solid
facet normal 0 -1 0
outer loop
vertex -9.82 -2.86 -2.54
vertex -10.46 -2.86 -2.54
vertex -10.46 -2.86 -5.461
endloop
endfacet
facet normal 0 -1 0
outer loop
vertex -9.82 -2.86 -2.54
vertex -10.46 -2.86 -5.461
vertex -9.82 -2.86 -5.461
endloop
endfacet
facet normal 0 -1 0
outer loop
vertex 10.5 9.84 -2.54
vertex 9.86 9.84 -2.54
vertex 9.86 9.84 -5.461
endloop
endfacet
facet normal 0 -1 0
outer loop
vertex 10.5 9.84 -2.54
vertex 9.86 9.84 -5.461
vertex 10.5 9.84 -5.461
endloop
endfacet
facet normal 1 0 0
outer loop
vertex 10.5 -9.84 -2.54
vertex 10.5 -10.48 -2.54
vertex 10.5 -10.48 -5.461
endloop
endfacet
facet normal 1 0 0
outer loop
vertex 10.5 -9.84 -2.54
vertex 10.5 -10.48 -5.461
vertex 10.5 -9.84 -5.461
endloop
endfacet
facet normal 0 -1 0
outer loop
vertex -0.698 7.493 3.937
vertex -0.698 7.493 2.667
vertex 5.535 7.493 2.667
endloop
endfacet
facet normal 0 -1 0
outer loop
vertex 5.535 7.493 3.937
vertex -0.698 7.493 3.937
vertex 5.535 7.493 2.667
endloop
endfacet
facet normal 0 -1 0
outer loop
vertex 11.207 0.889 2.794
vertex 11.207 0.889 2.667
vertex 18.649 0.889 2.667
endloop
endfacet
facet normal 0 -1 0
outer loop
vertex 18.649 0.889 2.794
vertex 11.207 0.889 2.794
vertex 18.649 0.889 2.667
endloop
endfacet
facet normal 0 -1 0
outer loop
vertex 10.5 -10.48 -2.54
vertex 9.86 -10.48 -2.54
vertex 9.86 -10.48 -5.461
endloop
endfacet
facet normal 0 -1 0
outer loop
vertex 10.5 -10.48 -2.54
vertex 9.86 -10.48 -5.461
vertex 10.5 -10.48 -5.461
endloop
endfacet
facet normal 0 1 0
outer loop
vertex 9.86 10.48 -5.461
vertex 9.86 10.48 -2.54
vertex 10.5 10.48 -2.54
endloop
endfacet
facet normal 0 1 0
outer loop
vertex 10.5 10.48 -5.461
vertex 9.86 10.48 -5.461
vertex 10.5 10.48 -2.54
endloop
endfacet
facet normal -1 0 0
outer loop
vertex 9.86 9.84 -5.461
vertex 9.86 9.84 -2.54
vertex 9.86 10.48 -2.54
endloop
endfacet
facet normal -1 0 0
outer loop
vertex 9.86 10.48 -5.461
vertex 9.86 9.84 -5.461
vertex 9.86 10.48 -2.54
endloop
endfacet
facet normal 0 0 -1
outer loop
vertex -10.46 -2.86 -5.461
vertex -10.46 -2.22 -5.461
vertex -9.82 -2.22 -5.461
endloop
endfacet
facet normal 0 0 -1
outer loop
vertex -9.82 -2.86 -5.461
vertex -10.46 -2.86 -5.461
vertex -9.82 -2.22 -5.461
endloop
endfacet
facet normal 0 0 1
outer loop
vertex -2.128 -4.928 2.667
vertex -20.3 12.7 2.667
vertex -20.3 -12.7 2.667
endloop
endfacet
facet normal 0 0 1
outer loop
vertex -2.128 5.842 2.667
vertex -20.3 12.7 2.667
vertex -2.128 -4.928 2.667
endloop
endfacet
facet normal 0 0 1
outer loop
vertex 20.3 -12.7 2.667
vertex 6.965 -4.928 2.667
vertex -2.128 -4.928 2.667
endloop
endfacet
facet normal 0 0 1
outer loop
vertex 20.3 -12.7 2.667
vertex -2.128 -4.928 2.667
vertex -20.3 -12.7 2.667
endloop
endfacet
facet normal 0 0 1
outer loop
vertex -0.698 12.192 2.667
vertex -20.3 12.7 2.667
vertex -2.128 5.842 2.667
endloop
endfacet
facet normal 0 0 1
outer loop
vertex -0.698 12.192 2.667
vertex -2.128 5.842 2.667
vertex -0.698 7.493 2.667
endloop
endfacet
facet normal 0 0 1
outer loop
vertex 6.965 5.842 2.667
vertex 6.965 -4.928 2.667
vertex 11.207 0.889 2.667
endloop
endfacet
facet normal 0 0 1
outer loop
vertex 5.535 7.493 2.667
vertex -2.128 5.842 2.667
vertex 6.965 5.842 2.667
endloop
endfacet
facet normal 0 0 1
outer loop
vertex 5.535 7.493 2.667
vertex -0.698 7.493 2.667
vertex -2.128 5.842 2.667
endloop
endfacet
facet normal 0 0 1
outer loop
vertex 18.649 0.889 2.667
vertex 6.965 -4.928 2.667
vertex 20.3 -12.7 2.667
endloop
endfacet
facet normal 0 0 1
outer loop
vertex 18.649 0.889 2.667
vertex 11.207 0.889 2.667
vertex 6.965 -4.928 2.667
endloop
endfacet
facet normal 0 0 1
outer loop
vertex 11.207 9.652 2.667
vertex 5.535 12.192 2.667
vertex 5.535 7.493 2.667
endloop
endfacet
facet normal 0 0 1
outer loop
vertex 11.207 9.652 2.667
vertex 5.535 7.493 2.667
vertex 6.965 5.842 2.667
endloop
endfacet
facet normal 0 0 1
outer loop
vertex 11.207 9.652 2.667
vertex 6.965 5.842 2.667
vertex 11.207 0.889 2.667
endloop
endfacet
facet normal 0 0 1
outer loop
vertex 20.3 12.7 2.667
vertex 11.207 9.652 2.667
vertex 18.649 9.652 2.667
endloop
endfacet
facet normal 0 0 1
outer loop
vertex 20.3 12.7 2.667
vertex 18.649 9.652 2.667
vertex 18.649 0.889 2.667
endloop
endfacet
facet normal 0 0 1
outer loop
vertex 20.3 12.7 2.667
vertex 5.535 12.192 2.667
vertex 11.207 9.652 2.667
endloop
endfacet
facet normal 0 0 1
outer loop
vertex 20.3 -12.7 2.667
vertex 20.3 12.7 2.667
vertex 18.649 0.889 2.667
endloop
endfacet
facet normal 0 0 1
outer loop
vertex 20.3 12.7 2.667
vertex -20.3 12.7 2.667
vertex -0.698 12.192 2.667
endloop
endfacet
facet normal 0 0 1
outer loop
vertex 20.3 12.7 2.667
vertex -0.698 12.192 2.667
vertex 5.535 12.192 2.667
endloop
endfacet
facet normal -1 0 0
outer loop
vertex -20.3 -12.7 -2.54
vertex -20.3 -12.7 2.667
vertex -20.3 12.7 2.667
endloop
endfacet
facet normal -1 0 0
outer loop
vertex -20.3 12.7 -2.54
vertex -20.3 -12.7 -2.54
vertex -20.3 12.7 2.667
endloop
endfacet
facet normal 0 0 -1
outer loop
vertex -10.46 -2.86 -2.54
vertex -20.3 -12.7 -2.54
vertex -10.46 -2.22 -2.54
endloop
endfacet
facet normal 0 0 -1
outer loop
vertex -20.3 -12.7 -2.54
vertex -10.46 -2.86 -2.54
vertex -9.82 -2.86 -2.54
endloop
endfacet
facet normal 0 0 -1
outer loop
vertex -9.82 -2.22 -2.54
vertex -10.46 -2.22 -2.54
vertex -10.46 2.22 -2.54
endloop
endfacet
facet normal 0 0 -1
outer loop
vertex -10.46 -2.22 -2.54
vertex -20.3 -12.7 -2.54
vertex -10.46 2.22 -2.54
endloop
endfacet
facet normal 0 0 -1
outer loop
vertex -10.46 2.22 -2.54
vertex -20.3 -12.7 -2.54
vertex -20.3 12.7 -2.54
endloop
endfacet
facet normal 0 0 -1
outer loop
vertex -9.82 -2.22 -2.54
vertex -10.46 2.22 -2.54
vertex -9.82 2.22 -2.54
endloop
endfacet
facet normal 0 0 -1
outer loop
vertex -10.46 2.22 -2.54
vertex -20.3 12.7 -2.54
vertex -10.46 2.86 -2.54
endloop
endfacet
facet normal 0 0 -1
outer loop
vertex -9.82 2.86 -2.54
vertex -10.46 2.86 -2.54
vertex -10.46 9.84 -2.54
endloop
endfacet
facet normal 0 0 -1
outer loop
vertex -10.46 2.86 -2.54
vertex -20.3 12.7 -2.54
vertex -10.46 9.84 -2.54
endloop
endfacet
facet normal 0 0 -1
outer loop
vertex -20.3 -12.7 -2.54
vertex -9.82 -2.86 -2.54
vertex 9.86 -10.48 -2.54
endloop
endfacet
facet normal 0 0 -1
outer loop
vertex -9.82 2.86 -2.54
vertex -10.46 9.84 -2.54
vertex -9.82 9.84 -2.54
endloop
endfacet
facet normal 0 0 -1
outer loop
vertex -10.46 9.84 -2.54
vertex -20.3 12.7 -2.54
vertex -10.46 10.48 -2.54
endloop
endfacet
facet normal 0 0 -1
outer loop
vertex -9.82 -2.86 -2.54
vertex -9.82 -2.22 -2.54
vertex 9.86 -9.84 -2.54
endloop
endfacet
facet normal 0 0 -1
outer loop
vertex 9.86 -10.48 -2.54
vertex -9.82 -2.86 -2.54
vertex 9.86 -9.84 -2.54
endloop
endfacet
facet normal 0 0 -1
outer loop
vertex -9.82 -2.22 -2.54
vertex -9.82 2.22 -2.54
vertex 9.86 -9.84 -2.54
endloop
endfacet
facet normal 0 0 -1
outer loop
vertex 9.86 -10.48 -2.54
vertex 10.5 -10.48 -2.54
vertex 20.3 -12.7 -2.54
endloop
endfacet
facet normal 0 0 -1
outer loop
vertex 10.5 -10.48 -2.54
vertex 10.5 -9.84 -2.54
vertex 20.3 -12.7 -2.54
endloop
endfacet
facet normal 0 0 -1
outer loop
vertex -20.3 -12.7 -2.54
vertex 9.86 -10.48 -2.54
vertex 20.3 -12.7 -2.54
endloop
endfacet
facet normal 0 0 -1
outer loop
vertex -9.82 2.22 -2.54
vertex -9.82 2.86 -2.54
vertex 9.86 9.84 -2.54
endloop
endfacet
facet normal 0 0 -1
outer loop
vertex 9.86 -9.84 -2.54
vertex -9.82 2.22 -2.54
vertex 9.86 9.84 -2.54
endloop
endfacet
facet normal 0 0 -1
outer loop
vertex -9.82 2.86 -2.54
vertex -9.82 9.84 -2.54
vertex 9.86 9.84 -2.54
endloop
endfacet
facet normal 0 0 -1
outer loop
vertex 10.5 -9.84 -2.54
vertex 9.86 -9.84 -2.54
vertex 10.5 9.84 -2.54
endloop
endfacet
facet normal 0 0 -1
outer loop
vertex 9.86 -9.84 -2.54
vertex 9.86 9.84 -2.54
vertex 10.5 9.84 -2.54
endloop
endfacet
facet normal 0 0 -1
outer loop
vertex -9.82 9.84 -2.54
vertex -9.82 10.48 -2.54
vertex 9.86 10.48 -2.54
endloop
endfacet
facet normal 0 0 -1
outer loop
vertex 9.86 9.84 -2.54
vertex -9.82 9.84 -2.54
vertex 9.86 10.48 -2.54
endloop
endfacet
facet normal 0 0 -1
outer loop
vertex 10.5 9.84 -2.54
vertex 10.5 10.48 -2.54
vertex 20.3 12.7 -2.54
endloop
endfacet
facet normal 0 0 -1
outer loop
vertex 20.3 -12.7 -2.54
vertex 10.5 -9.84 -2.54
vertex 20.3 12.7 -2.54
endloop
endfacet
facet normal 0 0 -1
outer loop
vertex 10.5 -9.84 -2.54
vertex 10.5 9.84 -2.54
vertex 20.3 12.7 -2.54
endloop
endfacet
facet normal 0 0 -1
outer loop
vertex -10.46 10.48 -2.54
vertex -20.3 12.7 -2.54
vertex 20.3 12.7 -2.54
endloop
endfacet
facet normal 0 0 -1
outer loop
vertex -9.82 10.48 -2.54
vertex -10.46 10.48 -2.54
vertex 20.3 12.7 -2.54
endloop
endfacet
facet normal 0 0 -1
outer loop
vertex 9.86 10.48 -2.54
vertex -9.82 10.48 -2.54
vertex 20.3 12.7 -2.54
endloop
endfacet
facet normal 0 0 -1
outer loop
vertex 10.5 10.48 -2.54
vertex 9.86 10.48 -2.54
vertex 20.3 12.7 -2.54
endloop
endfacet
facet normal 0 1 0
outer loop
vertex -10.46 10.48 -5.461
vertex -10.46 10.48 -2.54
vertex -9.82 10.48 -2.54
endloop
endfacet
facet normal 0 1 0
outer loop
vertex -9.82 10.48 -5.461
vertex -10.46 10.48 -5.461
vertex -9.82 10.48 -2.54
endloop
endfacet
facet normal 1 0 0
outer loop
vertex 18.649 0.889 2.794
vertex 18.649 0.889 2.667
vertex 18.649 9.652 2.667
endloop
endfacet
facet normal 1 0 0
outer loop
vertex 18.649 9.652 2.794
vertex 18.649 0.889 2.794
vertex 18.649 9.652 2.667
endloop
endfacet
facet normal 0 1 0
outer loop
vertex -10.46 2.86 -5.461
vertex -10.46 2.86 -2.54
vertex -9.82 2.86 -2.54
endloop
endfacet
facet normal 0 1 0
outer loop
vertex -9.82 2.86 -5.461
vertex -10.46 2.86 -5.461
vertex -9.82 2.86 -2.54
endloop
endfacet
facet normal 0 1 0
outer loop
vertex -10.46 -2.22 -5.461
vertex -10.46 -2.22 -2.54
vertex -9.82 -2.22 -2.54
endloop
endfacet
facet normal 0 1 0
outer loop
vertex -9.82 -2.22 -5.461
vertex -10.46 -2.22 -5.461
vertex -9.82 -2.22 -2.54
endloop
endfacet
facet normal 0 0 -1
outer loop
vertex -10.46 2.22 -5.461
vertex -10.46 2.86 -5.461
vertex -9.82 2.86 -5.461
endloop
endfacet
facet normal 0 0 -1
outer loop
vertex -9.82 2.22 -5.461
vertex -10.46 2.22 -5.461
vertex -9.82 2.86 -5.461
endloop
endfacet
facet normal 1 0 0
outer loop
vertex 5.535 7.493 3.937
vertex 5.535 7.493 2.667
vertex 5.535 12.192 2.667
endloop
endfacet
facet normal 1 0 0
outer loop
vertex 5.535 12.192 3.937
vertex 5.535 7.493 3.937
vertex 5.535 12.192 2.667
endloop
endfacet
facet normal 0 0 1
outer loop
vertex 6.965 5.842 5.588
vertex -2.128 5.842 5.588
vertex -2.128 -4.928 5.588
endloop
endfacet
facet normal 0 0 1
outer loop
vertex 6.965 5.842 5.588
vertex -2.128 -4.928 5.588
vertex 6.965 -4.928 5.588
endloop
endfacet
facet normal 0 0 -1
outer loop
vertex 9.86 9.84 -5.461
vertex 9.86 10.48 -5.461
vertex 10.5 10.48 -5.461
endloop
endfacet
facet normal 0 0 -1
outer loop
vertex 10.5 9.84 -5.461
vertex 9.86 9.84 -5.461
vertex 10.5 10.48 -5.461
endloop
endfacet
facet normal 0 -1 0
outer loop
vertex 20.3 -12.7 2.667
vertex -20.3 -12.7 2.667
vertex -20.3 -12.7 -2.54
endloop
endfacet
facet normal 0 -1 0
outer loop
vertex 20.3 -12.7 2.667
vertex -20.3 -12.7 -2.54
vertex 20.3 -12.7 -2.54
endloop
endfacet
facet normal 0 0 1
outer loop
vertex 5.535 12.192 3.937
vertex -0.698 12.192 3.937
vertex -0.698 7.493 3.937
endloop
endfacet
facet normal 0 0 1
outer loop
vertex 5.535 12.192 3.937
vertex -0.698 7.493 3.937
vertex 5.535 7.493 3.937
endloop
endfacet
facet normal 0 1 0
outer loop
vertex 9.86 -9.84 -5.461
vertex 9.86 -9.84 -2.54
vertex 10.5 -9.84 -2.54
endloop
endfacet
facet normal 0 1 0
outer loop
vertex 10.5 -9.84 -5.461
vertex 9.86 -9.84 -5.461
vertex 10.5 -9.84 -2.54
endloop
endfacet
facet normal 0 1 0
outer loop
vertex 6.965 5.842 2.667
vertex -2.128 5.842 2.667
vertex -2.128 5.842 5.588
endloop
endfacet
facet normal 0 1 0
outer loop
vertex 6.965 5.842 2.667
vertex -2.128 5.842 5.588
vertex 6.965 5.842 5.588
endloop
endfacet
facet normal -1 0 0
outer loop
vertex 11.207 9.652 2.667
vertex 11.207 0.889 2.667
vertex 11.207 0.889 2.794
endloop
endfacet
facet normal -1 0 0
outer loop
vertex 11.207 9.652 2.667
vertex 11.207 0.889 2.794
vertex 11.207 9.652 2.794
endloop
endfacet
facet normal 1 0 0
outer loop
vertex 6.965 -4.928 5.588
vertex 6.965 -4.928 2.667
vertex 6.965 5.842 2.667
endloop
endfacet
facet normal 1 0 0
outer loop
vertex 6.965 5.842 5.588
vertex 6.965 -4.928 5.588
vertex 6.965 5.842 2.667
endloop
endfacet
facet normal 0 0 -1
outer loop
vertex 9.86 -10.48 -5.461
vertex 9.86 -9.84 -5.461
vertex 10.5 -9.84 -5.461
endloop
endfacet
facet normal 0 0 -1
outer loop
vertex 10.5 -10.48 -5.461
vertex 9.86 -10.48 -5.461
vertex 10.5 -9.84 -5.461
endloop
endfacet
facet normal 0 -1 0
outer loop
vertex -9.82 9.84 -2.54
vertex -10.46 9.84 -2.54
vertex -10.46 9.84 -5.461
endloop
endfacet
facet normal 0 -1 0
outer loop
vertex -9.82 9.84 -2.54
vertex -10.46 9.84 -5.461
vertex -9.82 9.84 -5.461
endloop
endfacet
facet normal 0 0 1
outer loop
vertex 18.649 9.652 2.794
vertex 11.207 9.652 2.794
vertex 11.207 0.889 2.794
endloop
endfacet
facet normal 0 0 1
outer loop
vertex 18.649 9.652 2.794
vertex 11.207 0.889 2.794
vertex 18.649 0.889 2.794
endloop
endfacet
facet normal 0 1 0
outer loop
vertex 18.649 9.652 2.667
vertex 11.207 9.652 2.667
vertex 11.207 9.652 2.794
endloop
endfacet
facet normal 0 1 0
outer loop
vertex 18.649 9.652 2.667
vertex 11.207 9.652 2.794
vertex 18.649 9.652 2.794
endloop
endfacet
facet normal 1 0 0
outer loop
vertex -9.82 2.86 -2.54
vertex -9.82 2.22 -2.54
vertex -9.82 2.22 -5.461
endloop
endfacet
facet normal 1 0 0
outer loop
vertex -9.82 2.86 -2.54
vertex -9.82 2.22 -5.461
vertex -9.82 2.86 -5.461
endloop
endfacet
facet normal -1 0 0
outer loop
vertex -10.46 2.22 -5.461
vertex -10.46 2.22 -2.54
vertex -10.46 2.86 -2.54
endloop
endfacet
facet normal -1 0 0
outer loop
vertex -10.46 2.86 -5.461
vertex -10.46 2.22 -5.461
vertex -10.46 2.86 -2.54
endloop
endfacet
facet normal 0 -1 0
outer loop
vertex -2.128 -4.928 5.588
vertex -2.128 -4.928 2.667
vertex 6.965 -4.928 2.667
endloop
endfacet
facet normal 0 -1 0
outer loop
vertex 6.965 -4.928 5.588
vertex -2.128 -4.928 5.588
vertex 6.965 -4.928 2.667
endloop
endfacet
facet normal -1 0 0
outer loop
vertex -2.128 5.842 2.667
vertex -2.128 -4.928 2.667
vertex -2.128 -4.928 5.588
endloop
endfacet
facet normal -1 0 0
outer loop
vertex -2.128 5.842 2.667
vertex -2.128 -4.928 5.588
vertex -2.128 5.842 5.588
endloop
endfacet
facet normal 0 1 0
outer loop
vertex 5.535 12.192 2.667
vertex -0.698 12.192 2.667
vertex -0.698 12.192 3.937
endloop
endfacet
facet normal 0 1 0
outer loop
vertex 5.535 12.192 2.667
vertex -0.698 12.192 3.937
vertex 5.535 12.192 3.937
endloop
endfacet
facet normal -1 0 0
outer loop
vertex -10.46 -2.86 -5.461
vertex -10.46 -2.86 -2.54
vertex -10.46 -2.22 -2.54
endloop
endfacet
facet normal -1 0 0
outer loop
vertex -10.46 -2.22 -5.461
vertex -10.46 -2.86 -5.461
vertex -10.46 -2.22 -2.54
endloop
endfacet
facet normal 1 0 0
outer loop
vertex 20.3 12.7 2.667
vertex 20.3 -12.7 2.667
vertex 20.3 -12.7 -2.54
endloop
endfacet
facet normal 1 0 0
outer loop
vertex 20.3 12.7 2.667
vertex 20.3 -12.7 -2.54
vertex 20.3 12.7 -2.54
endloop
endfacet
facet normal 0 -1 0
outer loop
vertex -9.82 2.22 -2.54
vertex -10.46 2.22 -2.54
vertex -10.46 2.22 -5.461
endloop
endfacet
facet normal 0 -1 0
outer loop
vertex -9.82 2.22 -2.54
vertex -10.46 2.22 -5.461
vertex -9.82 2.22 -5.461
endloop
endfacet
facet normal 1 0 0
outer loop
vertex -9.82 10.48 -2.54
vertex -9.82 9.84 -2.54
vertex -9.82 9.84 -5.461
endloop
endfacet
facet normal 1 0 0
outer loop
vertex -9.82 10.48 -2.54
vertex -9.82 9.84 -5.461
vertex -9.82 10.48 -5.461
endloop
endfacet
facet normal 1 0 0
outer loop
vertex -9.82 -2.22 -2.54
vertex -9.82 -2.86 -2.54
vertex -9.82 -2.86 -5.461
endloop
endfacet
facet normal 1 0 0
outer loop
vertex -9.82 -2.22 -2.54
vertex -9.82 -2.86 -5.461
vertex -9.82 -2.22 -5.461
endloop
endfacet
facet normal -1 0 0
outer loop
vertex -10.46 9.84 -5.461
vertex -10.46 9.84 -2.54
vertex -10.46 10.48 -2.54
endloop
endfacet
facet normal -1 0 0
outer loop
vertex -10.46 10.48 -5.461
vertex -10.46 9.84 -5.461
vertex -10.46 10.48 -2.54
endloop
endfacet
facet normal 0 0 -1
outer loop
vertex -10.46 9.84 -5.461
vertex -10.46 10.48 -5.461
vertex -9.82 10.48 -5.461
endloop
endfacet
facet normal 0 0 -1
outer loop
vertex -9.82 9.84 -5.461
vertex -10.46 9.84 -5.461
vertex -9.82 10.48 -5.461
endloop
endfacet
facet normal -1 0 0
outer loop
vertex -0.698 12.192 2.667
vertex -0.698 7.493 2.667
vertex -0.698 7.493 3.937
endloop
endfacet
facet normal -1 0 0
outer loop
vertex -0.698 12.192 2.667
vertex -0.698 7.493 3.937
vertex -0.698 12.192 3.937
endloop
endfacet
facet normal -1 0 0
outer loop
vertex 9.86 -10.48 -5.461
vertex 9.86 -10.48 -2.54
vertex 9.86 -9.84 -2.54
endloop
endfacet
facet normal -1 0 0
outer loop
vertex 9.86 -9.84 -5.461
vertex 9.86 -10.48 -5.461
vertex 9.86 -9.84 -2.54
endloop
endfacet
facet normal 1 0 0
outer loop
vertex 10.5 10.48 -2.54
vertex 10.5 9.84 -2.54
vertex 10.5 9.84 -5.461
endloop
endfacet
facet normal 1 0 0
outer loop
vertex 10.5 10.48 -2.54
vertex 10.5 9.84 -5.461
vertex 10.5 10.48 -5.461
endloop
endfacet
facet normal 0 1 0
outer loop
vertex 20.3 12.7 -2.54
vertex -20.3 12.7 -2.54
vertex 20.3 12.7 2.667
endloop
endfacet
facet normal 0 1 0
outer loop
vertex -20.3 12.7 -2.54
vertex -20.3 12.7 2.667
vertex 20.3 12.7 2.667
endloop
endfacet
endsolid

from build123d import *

# Parameters (mm, degrees)
F0_W     = 40.6
F0_H     = 25.4
F0_W_2   = 0.64
F0_H_2   = 0.64
F0_W_3   = 9.0932
F0_H_3   = 10.7696
F0_W_4   = 7.4422
F0_H_4   = 8.763
F0_W_5   = 6.23316
F0_H_5   = 4.699
F1_DEPTH = 2.667
F2_DEPTH = 5.588
F3_DEPTH = 3.937
F4_DEPTH = 2.794
F5_DEPTH = 2.54
F6_DEPTH = 5.461


with BuildPart() as f1:
    # F0 (on Top) → F1 (new body)
    with BuildSketch(Plane.XY):
        Rectangle(F0_W, F0_H)
        with Locations((-10.14, -2.54)):
            Rectangle(F0_W_2, F0_H_2, mode=Mode.SUBTRACT)
        with Locations((10.18, -10.16)):
            Rectangle(F0_W_2, F0_H_2, mode=Mode.SUBTRACT)
        with Locations((-10.14, 2.54)):
            Rectangle(F0_W_2, F0_H_2, mode=Mode.SUBTRACT)
        with Locations((-10.14, 10.16)):
            Rectangle(F0_W_2, F0_H_2, mode=Mode.SUBTRACT)
        with Locations((2.4184, 0.4572)):
            Rectangle(F0_W_3, F0_H_3, mode=Mode.SUBTRACT)
        with Locations((14.9279, 5.2705)):
            Rectangle(F0_W_4, F0_H_4, mode=Mode.SUBTRACT)
        with Locations((2.4184, 9.8425)):
            Rectangle(F0_W_5, F0_H_5, mode=Mode.SUBTRACT)
        with Locations((10.18, 10.16)):
            Rectangle(F0_W_2, F0_H_2, mode=Mode.SUBTRACT)
        with Locations((-10.14, 10.16)):
            Rectangle(F0_W_2, F0_H_2)
        with Locations((-10.14, 2.54)):
            Rectangle(F0_W_2, F0_H_2)
        with Locations((-10.14, -2.54)):
            Rectangle(F0_W_2, F0_H_2)
        with Locations((10.18, 10.16)):
            Rectangle(F0_W_2, F0_H_2)
        with Locations((10.18, -10.16)):
            Rectangle(F0_W_2, F0_H_2)
    extrude(amount=F1_DEPTH)

    # F0 (on Top) → F2 (join)
    with BuildSketch(Plane.XY):
        with Locations((2.4184, 0.4572)):
            Rectangle(F0_W_3, F0_H_3)
    extrude(amount=F2_DEPTH)

    # F0 (on Top) → F3 (join)
    with BuildSketch(Plane.XY):
        with Locations((2.4184, 9.8425)):
            Rectangle(F0_W_5, F0_H_5)
    extrude(amount=F3_DEPTH)

    # F0 (on Top) → F4 (join)
    with BuildSketch(Plane.XY):
        with Locations((14.9279, 5.2705)):
            Rectangle(F0_W_4, F0_H_4)
    extrude(amount=F4_DEPTH)

    # F0 (on Top) → F5 (join)
    with BuildSketch(Plane.XY):
        Rectangle(F0_W, F0_H)
        with Locations((-10.14, -2.54)):
            Rectangle(F0_W_2, F0_H_2, mode=Mode.SUBTRACT)
        with Locations((10.18, -10.16)):
            Rectangle(F0_W_2, F0_H_2, mode=Mode.SUBTRACT)
        with Locations((-10.14, 2.54)):
            Rectangle(F0_W_2, F0_H_2, mode=Mode.SUBTRACT)
        with Locations((-10.14, 10.16)):
            Rectangle(F0_W_2, F0_H_2, mode=Mode.SUBTRACT)
        with Locations((2.4184, 0.4572)):
            Rectangle(F0_W_3, F0_H_3, mode=Mode.SUBTRACT)
        with Locations((14.9279, 5.2705)):
            Rectangle(F0_W_4, F0_H_4, mode=Mode.SUBTRACT)
        with Locations((2.4184, 9.8425)):
            Rectangle(F0_W_5, F0_H_5, mode=Mode.SUBTRACT)
        with Locations((10.18, 10.16)):
            Rectangle(F0_W_2, F0_H_2, mode=Mode.SUBTRACT)
        with Locations((-10.14, -2.54)):
            Rectangle(F0_W_2, F0_H_2)
        with Locations((-10.14, 2.54)):
            Rectangle(F0_W_2, F0_H_2)
        with Locations((-10.14, 10.16)):
            Rectangle(F0_W_2, F0_H_2)
        with Locations((10.18, 10.16)):
            Rectangle(F0_W_2, F0_H_2)
        with Locations((2.4184, 9.8425)):
            Rectangle(F0_W_5, F0_H_5)
        with Locations((2.4184, 0.4572)):
            Rectangle(F0_W_3, F0_H_3)
        with Locations((14.9279, 5.2705)):
            Rectangle(F0_W_4, F0_H_4)
        with Locations((10.18, -10.16)):
            Rectangle(F0_W_2, F0_H_2)
    extrude(amount=-F5_DEPTH)

    # F0 (on Top) → F6 (join)
    with BuildSketch(Plane.XY):
        with Locations((-10.14, -2.54)):
            Rectangle(F0_W_2, F0_H_2)
        with Locations((-10.14, 2.54)):
            Rectangle(F0_W_2, F0_H_2)
        with Locations((-10.14, 10.16)):
            Rectangle(F0_W_2, F0_H_2)
        with Locations((10.18, 10.16)):
            Rectangle(F0_W_2, F0_H_2)
        with Locations((10.18, -10.16)):
            Rectangle(F0_W_2, F0_H_2)
    extrude(amount=-F6_DEPTH)


solid = f1.part
